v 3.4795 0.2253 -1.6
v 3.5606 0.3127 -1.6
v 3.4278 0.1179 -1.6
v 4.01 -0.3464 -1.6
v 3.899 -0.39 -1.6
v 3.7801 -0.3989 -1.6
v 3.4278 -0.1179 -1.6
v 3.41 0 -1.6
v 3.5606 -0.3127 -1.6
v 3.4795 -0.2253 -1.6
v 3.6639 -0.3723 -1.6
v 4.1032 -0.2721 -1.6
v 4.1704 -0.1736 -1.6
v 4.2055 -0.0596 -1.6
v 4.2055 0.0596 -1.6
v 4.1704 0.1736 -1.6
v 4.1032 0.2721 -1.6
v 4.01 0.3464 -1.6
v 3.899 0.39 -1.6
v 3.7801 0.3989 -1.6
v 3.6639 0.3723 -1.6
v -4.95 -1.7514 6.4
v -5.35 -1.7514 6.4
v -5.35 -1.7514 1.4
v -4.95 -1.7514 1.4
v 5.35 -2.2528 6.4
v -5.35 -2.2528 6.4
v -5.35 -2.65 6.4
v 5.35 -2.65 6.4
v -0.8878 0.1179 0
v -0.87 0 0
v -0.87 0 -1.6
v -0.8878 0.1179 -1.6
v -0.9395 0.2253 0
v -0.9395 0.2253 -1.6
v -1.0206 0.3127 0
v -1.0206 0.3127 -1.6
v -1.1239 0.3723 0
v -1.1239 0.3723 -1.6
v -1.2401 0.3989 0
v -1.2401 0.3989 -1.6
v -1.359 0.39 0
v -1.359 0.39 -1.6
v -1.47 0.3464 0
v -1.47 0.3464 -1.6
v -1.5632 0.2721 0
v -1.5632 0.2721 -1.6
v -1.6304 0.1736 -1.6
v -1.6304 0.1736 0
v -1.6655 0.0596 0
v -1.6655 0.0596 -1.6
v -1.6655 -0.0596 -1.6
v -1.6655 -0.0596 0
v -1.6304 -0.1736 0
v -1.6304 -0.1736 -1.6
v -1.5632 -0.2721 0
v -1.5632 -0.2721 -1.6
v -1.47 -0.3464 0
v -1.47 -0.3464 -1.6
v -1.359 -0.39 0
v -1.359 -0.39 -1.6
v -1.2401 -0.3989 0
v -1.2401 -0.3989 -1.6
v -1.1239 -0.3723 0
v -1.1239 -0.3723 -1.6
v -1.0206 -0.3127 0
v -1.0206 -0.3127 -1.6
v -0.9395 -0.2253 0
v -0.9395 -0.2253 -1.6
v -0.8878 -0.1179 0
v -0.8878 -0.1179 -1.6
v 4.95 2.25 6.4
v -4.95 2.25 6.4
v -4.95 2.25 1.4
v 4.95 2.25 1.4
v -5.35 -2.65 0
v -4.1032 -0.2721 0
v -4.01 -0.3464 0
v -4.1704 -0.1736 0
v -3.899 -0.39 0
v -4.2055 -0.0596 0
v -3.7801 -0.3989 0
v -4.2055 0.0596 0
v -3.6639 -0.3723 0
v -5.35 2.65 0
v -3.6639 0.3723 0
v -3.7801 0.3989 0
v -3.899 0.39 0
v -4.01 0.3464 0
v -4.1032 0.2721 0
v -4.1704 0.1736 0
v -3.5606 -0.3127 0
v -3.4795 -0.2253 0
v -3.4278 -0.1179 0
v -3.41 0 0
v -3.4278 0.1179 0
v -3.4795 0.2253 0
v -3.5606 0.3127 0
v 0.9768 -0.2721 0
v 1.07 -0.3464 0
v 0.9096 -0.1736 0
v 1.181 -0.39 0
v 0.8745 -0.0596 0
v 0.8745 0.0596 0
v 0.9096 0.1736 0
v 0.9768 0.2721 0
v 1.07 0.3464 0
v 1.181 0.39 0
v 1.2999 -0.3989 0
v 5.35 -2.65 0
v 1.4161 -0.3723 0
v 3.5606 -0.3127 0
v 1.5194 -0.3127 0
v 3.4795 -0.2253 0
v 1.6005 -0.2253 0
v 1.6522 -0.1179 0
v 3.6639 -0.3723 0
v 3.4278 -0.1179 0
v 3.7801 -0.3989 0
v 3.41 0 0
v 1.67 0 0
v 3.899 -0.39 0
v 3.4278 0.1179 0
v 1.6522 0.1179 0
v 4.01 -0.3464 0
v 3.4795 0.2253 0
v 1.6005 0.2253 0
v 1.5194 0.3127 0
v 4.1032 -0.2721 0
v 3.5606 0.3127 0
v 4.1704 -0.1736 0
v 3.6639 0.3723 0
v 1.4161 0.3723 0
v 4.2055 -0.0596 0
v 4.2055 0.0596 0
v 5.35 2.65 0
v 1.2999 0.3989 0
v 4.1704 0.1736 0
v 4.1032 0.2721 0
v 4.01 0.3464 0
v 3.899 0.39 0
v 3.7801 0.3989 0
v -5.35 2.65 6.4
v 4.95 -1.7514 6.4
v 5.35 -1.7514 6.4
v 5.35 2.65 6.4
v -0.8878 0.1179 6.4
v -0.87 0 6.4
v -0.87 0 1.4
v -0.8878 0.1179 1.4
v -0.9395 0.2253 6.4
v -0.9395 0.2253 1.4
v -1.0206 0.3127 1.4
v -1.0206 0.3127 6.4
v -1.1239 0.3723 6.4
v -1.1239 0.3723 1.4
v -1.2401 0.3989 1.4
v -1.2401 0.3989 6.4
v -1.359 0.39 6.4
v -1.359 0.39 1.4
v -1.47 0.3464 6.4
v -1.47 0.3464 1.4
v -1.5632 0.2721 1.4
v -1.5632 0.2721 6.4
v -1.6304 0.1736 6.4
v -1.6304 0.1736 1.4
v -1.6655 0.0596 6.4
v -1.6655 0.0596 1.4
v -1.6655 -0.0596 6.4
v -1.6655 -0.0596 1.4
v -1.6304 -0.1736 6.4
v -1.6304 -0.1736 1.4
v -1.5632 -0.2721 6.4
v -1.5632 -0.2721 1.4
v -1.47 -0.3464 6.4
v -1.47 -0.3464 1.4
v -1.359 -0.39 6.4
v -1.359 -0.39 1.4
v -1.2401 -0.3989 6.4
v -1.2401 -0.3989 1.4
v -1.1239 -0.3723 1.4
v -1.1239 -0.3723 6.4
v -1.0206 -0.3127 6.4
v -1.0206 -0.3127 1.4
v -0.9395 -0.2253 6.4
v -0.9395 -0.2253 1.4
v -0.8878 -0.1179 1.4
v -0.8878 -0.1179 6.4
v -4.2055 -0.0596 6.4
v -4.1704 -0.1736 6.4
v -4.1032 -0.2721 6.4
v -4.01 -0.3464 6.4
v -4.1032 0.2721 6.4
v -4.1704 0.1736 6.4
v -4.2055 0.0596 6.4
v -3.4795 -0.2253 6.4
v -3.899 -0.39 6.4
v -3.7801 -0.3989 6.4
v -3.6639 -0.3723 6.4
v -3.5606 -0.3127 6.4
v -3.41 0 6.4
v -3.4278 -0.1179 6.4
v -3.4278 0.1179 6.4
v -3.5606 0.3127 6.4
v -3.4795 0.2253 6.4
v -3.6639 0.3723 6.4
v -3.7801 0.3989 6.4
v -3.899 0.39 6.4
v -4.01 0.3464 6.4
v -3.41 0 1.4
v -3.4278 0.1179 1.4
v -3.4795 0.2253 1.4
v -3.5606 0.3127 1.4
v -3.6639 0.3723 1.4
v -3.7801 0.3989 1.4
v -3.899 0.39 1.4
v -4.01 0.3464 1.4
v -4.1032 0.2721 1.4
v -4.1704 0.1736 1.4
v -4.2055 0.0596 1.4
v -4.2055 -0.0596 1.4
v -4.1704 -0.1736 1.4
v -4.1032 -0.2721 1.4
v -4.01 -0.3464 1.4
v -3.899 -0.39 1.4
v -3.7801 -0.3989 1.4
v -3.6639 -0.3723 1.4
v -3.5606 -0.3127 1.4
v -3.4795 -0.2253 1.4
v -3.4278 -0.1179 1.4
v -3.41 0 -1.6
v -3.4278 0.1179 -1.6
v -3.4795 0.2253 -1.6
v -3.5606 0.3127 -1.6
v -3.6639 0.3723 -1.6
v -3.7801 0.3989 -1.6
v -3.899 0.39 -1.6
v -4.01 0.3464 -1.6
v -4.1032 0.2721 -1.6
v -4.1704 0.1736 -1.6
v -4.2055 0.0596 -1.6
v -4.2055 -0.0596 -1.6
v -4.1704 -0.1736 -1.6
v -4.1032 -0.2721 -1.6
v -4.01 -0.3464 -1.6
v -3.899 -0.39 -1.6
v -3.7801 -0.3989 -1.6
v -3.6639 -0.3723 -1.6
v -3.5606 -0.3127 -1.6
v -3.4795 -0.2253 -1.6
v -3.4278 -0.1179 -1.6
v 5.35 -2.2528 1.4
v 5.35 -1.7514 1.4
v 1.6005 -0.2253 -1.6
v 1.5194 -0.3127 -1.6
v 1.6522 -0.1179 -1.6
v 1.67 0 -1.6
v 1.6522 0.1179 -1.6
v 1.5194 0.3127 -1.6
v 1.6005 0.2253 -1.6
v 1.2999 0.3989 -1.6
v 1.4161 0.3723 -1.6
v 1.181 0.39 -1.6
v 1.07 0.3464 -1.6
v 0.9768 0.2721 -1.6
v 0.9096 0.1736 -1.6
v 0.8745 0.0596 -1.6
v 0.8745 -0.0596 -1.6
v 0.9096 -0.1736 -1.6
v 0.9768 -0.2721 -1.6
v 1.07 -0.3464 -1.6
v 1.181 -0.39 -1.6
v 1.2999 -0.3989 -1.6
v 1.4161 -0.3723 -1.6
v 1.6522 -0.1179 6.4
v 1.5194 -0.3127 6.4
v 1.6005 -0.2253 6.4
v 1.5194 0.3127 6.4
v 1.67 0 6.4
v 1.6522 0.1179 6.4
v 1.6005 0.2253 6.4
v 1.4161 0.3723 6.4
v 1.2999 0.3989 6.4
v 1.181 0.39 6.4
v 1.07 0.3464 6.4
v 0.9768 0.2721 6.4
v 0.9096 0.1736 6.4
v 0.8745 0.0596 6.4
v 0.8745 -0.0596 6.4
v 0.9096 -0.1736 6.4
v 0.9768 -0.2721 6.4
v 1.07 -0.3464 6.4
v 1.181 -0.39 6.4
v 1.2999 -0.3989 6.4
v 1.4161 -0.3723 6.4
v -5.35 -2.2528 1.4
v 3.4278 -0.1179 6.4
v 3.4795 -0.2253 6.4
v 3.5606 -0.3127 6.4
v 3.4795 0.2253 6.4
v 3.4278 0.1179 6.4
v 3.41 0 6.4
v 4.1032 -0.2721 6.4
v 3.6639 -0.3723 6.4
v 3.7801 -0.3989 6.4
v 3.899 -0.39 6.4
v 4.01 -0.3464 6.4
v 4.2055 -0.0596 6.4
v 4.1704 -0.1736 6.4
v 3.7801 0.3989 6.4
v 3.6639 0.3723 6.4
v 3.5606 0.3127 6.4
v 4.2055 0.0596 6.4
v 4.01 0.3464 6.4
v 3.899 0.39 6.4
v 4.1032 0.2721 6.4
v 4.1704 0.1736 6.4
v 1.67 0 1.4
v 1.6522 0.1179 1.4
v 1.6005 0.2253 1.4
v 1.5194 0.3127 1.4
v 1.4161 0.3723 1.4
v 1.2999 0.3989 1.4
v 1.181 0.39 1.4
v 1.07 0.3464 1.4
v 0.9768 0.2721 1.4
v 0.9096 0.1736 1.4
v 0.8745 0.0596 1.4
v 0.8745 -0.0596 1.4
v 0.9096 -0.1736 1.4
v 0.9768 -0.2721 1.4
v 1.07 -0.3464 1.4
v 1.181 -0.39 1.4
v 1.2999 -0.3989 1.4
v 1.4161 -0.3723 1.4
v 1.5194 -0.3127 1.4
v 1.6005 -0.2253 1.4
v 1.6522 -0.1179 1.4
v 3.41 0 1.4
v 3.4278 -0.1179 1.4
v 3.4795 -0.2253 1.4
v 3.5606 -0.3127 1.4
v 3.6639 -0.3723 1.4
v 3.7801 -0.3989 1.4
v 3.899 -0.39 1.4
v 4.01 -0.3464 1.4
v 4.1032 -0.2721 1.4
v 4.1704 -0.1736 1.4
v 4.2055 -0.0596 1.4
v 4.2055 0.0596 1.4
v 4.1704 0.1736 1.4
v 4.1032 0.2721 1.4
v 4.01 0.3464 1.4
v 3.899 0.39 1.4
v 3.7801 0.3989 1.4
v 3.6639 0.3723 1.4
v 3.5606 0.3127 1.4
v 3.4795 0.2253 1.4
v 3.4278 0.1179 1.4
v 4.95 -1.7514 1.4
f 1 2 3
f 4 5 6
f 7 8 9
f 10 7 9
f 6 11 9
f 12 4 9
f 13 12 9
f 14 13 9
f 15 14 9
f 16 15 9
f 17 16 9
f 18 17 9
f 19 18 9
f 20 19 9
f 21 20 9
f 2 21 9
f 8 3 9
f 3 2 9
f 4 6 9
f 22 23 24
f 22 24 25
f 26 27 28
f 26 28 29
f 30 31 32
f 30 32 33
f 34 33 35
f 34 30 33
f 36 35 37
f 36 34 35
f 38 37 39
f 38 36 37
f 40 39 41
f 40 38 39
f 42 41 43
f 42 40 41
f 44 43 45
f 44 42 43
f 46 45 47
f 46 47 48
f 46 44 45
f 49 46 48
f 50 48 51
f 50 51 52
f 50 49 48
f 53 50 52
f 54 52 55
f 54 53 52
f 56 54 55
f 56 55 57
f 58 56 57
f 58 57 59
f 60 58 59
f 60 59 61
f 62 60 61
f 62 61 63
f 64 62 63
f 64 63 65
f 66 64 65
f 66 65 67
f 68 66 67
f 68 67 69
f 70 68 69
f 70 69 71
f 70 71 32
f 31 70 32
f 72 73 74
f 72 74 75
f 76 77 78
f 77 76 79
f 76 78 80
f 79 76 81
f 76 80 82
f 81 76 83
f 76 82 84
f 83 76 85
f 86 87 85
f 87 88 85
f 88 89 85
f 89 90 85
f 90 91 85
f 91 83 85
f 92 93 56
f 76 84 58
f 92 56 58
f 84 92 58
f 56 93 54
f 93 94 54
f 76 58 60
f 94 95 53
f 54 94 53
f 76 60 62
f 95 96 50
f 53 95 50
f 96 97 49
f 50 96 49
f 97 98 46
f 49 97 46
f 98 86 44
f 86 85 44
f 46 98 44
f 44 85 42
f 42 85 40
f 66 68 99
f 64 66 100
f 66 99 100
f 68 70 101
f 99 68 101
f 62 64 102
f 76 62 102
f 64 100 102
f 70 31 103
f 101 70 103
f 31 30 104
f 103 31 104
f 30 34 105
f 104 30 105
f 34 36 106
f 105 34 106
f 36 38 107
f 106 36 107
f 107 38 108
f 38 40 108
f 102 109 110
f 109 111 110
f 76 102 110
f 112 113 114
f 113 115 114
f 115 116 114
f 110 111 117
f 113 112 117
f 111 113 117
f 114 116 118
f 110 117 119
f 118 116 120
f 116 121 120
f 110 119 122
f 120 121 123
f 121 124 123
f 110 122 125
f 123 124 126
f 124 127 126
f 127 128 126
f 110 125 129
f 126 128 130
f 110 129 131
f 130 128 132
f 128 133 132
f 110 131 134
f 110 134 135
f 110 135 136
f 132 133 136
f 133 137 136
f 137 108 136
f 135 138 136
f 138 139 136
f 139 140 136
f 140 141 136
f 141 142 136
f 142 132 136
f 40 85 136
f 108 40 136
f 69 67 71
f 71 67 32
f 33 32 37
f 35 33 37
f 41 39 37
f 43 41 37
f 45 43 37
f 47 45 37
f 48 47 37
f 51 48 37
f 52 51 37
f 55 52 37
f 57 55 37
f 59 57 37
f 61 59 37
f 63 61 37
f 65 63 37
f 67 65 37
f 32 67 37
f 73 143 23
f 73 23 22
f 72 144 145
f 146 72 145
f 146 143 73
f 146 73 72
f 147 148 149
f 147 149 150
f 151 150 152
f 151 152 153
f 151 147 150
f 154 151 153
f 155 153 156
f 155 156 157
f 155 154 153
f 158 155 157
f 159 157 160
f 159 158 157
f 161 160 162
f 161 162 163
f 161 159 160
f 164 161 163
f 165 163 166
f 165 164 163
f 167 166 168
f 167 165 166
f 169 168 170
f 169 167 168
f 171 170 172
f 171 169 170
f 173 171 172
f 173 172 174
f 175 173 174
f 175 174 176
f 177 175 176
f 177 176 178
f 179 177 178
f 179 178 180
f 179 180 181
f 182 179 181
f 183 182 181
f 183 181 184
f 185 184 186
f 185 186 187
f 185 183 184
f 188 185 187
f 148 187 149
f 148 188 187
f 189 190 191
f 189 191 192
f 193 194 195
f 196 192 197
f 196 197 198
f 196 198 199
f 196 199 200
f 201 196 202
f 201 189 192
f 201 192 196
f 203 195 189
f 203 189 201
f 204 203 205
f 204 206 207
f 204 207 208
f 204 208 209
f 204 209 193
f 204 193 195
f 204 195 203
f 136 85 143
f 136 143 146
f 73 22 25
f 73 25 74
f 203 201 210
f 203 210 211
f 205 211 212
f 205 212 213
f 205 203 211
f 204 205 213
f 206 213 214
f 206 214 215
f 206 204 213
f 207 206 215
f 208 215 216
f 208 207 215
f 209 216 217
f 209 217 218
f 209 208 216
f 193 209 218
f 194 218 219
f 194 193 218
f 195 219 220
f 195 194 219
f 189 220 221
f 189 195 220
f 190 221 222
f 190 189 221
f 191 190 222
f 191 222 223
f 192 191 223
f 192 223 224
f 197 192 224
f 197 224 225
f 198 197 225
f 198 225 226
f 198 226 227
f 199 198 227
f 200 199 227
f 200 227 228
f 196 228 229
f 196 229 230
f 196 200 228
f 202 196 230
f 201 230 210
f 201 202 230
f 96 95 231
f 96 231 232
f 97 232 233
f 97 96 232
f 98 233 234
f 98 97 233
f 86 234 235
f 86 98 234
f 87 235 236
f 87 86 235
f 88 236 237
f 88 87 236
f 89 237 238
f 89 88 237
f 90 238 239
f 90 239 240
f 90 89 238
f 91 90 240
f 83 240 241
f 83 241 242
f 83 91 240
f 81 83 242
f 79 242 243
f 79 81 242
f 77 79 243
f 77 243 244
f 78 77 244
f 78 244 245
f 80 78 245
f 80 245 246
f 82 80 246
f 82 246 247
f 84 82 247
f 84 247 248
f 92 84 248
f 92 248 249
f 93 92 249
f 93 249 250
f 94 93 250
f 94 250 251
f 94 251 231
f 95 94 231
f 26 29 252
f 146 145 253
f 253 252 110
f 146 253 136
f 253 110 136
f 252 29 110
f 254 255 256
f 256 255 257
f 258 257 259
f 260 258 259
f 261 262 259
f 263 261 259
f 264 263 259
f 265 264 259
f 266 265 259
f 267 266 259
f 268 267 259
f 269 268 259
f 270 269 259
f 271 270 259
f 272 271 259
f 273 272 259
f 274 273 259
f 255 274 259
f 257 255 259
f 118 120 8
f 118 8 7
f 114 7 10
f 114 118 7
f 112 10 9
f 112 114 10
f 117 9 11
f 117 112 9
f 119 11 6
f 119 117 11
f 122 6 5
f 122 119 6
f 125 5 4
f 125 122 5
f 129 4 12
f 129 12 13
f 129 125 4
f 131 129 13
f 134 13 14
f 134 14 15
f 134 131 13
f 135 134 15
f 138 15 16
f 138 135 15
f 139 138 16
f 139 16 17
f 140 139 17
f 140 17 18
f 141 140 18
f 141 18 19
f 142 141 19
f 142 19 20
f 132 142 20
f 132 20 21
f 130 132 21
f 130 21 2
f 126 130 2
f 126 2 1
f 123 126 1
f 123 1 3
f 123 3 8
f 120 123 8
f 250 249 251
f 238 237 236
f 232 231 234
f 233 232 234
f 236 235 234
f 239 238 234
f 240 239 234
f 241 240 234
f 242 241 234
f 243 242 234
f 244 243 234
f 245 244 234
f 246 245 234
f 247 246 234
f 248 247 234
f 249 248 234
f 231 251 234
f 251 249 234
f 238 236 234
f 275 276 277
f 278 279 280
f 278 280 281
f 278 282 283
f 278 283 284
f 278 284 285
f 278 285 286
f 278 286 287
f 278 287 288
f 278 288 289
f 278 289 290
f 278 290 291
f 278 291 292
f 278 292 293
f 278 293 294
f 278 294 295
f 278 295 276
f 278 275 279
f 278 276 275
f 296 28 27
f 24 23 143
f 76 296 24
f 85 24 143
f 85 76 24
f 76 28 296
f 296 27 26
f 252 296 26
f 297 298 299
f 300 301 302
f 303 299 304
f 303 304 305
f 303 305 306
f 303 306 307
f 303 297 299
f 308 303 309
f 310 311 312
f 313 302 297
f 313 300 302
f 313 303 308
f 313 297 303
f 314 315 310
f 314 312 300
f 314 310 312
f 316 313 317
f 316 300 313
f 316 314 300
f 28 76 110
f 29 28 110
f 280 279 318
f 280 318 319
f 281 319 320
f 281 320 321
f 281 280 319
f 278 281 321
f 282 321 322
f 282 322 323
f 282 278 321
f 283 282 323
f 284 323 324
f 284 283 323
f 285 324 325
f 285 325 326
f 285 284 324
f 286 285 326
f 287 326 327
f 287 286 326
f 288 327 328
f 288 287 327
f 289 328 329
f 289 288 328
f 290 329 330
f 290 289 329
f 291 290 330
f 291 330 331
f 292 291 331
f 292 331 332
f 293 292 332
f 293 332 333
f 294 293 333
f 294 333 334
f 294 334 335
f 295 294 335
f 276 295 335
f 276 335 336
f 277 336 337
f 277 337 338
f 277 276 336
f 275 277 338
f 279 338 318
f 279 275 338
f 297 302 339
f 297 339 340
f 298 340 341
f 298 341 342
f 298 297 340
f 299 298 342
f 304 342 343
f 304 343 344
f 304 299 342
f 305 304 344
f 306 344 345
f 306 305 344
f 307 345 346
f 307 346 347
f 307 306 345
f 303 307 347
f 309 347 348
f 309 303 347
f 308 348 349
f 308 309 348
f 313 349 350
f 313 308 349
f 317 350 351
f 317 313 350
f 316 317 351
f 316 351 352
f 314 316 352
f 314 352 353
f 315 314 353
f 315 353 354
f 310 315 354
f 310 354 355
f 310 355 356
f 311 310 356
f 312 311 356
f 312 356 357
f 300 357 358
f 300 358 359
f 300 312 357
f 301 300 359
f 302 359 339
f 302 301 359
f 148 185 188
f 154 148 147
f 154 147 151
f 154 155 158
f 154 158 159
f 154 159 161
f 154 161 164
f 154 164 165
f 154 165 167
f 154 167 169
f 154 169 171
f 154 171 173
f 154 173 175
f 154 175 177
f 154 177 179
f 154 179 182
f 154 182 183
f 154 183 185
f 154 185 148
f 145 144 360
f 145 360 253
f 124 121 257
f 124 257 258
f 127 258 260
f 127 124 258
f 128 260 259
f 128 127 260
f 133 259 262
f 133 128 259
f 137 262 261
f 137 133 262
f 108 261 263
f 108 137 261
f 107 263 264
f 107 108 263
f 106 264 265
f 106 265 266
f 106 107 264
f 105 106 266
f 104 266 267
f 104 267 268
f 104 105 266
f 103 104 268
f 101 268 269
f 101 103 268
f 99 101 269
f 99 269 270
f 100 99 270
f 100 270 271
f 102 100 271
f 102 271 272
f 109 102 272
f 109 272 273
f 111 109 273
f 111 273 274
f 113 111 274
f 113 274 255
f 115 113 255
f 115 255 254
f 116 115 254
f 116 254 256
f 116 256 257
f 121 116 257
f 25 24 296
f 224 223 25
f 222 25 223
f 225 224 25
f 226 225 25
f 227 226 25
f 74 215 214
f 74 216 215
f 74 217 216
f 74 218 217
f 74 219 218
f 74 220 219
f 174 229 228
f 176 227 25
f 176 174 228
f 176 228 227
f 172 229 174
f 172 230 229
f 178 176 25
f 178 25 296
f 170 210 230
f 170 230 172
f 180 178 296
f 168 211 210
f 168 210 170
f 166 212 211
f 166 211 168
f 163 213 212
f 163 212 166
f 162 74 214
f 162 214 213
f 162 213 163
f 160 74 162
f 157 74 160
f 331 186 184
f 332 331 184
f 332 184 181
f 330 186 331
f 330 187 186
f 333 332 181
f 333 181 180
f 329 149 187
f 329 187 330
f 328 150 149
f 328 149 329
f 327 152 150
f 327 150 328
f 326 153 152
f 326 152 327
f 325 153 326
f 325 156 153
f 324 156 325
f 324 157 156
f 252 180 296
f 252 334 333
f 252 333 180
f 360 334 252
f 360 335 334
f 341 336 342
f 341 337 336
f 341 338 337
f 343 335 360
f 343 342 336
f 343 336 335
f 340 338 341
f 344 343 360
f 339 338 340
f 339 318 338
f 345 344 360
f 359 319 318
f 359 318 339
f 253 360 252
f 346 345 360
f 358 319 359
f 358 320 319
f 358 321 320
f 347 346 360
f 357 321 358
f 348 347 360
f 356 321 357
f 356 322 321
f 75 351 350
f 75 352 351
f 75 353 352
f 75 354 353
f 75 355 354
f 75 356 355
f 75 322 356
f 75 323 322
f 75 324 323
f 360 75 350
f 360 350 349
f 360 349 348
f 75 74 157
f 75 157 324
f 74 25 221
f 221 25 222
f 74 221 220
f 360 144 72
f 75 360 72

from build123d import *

# Parameters (mm, degrees)
SKETCH_1_W          = 10.7
SKETCH_1_H          = 5.3
EXTRUDE_1_DEPTH     = 6.4
SKETCH_2_W          = 9.9
SKETCH_2_H          = 4.5
SKETCH_2_R          = 0.4
CUT_EXTRUDE_1_DEPTH = 5
SKETCH_3_W          = 12.899416502
SKETCH_3_H          = 0.501475964
CUT_EXTRUDE_2_DEPTH = 5
SKETCH_4_R          = 0.4
EXTRUDE_2_DEPTH     = 8


with BuildPart() as part:
    # Эскиз1 → Вытянуть1 (new body)
    with BuildSketch(Plane.XY):
        Rectangle(SKETCH_1_W, SKETCH_1_H)
    extrude(amount=EXTRUDE_1_DEPTH)

    # Эскиз2 → Вырез-Вытянуть1 (cut)
    with BuildSketch(Plane.XY.offset(6.4)):
        Rectangle(SKETCH_2_W, SKETCH_2_H)
        with Locations((-1.27, 0)):
            Circle(SKETCH_2_R, mode=Mode.SUBTRACT)
        with Locations((1.27, 0)):
            Circle(SKETCH_2_R, mode=Mode.SUBTRACT)
        with Locations((-3.81, 0)):
            Circle(SKETCH_2_R, mode=Mode.SUBTRACT)
        with Locations(Location((3.81, 0, 0), (0, 0, 180))):
            Circle(SKETCH_2_R, mode=Mode.SUBTRACT)
    extrude(amount=-CUT_EXTRUDE_1_DEPTH, mode=Mode.SUBTRACT)

    # Эскиз3 → Вырез-Вытянуть2 (cut)
    with BuildSketch(Plane.XY.offset(6.4)):
        with Locations((-0.066925705, -2.002104797)):
            Rectangle(SKETCH_3_W, SKETCH_3_H)
    extrude(amount=-CUT_EXTRUDE_2_DEPTH, mode=Mode.SUBTRACT)

    # Эскиз4 → Вытянуть2 (add)
    with BuildSketch(Plane.XY.offset(6.4)):
        with Locations((-1.27, 0)):
            Circle(SKETCH_4_R)
        with Locations((1.27, 0)):
            Circle(SKETCH_4_R)
        with Locations((-3.81, 0)):
            Circle(SKETCH_4_R)
        with Locations(Location((3.81, 0, 0), (0, 0, 180))):
            Circle(SKETCH_4_R)
    extrude(amount=-EXTRUDE_2_DEPTH)


solid = part.part
